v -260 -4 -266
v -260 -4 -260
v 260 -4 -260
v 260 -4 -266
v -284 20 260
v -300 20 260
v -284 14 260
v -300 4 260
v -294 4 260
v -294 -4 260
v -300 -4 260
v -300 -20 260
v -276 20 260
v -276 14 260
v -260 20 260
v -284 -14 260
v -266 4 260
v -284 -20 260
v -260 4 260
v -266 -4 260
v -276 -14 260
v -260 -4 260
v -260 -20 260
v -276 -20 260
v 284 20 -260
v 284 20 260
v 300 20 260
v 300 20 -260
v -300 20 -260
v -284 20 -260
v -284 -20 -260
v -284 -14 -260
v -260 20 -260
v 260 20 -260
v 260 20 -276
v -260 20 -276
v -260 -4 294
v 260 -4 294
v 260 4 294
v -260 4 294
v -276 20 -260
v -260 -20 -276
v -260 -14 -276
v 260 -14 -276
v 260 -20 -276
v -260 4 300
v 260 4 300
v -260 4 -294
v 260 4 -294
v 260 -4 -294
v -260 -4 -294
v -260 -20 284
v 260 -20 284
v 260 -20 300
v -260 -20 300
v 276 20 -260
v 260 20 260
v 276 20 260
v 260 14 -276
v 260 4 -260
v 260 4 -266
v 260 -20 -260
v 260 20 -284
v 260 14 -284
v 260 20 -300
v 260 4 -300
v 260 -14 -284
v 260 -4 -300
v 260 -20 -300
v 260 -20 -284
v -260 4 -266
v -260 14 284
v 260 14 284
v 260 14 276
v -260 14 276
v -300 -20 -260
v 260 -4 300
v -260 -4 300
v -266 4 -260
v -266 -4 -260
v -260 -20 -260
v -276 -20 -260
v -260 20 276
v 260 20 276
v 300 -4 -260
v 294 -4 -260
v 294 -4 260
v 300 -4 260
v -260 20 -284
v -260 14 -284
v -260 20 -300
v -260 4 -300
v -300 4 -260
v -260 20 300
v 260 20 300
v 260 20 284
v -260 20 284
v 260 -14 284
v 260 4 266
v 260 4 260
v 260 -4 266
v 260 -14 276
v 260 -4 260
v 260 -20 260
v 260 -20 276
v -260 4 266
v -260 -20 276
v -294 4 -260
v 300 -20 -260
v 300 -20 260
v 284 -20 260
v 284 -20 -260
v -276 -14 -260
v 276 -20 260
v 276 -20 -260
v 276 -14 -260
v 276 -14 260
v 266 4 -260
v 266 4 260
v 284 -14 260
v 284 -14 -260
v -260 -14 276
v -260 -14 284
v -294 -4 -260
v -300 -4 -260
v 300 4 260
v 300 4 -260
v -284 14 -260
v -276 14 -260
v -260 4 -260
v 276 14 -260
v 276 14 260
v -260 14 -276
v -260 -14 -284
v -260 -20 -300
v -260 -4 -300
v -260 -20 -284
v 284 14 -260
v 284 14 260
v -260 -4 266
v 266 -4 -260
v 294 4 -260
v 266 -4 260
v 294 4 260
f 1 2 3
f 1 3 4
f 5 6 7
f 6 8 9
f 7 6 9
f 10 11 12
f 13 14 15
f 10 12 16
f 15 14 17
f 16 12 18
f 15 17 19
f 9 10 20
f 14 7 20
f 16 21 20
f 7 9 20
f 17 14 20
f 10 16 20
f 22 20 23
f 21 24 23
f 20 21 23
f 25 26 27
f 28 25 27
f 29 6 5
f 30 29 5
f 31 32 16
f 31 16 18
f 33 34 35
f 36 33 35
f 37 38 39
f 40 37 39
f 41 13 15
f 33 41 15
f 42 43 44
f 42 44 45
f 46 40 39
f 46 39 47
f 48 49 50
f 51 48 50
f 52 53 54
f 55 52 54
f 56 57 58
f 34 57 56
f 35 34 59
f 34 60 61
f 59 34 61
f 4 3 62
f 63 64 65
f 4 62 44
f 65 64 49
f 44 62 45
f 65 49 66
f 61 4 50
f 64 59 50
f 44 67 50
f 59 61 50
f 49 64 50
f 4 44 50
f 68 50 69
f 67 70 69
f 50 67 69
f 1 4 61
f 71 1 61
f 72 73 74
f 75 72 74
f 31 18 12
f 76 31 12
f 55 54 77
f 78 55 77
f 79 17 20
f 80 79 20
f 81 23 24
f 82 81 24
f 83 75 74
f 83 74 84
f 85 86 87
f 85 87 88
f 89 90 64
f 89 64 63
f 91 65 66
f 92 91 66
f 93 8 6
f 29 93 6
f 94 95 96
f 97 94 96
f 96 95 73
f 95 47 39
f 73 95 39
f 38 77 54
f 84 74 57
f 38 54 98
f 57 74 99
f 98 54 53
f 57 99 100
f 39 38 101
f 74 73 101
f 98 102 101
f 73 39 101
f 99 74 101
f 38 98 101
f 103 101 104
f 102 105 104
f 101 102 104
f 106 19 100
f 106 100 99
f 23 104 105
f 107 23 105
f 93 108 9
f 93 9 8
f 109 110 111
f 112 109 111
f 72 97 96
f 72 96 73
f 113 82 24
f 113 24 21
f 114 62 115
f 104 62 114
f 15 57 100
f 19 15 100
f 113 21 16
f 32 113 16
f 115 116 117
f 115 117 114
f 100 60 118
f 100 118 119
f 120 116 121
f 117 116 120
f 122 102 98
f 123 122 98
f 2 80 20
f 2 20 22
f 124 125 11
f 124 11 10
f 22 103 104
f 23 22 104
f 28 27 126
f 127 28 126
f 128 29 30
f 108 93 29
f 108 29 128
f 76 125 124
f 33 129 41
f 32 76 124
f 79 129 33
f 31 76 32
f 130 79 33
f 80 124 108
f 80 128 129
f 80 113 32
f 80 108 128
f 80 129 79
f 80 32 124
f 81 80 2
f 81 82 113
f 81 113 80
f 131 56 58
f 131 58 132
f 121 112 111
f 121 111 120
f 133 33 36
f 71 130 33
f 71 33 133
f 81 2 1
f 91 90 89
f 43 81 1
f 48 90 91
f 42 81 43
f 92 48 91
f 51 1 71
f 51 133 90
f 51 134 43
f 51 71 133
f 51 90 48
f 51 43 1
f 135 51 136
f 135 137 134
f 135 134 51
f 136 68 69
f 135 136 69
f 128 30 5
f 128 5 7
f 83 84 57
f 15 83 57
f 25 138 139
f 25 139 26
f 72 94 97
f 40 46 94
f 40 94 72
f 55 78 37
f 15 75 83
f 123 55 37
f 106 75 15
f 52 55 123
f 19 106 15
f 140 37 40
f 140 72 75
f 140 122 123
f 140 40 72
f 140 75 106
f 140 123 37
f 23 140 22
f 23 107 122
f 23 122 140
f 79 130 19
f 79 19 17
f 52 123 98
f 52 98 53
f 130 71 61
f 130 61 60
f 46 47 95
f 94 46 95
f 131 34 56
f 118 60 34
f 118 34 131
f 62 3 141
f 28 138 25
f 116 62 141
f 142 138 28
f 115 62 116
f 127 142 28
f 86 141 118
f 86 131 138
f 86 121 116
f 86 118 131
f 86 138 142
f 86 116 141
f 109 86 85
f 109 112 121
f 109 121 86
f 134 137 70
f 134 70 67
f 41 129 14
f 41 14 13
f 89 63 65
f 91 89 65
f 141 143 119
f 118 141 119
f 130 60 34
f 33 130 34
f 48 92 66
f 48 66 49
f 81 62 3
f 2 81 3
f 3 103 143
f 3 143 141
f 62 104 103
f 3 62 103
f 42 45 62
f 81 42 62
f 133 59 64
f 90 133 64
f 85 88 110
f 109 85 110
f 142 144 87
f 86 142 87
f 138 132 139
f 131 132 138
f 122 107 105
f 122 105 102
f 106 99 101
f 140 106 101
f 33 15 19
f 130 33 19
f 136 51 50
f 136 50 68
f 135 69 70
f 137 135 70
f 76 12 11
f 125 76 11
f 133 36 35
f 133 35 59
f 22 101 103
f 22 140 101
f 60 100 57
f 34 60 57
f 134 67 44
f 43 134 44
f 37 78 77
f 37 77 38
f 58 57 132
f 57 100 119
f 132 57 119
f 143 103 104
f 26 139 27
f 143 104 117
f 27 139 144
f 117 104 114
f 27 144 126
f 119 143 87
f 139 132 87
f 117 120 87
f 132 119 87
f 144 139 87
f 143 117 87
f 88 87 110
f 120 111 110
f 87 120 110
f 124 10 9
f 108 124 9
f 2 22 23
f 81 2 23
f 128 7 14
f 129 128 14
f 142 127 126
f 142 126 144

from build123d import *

# Parameters (mm, degrees)
BOSS_EXTRUDE2_DEPTH        = 280
BOSS_EXTRUDE2_DEPTH_BACK   = 280
BOSS_EXTRUDE2_2_DEPTH      = 280
BOSS_EXTRUDE2_2_DEPTH_BACK = 280
BOSS_EXTRUDE3_DEPTH        = 280
BOSS_EXTRUDE3_DEPTH_BACK   = 280
CUT_EXTRUDE1_DEPTH         = 425.735211632
CUT_EXTRUDE1_DEPTH_BACK    = 425.735211632
SKETCH6_W                  = 40
SKETCH6_H                  = 40


with BuildPart() as part:
    # Sketch4 → Boss-Extrude2 (new, two sides: drawn at the far end of the back side and taken through both)
    with BuildSketch(Plane.XY.offset(-BOSS_EXTRUDE2_DEPTH_BACK)):
        Polygon((300, -20), (284, -20), (284, -14), (276, -14), (276, -20), (260, -20), (260, -4), (266, -4), (266, 4), (260, 4), (260, 20), (276, 20), (276, 14), (284, 14), (284, 20), (300, 20), (300, 4), (294, 4), (294, -4), (300, -4), align=None)
    extrude(amount=BOSS_EXTRUDE2_DEPTH + BOSS_EXTRUDE2_DEPTH_BACK)

    # Sketch5 → Boss-Extrude3 (add, two sides: drawn at the far end of the back side and taken through both)
    with BuildSketch(Plane(origin=(0, 0, 0), x_dir=(0, 0, -1), z_dir=(1, 0, 0)).offset(-BOSS_EXTRUDE3_DEPTH_BACK)):
        Polygon((300, -20), (284, -20), (284, -14), (276, -14), (276, -20), (260, -20), (260, -4), (266, -4), (266, 4), (260, 4), (260, 20), (276, 20), (276, 14), (284, 14), (284, 20), (300, 20), (300, 4), (294, 4), (294, -4), (300, -4), align=None)
        Polygon((-276, 20), (-260, 20), (-260, 4), (-266, 4), (-266, -4), (-260, -4), (-260, -20), (-276, -20), (-276, -14), (-284, -14), (-284, -20), (-300, -20), (-300, -4), (-294, -4), (-294, 4), (-300, 4), (-300, 20), (-284, 20), (-284, 14), (-276, 14), align=None)
    extrude(amount=BOSS_EXTRUDE3_DEPTH + BOSS_EXTRUDE3_DEPTH_BACK)


with BuildPart() as body_2:
    # Sketch4 → Boss-Extrude2 2 (new, two sides: drawn at the far end of the back side and taken through both)
    with BuildSketch(Plane.XY.offset(-BOSS_EXTRUDE2_2_DEPTH_BACK)):
        Polygon((-276, 20), (-260, 20), (-260, 4), (-266, 4), (-266, -4), (-260, -4), (-260, -20), (-276, -20), (-276, -14), (-284, -14), (-284, -20), (-300, -20), (-300, -4), (-294, -4), (-294, 4), (-300, 4), (-300, 20), (-284, 20), (-284, 14), (-276, 14), align=None)
    extrude(amount=BOSS_EXTRUDE2_2_DEPTH + BOSS_EXTRUDE2_2_DEPTH_BACK)


with BuildPart() as cut_extrude1_tool:
    # Sketch6 → Cut-Extrude1 (new, two sides: drawn at the far end of the back side and taken through both)
    with BuildSketch(Plane(origin=(0, 0, 0), x_dir=(1, 0, 0), z_dir=(0, 1, 0)).offset(-CUT_EXTRUDE1_DEPTH_BACK)):
        with Locations((-280, 280)):
            Rectangle(SKETCH6_W, SKETCH6_H)
        with Locations((-280, -280)):
            Rectangle(SKETCH6_W, SKETCH6_H)
        with Locations((280, -280)):
            Rectangle(SKETCH6_W, SKETCH6_H)
        with Locations((280, 280)):
            Rectangle(SKETCH6_W, SKETCH6_H)
    extrude(amount=CUT_EXTRUDE1_DEPTH + CUT_EXTRUDE1_DEPTH_BACK)


with BuildPart() as part_1:
    add(part.part)

    # Cut-Extrude1: cut by cut_extrude1_tool
    add(cut_extrude1_tool.part, mode=Mode.SUBTRACT)


with BuildPart() as body_2_1:
    add(body_2.part)

    # Cut-Extrude1: cut by cut_extrude1_tool
    add(cut_extrude1_tool.part, mode=Mode.SUBTRACT)


solid = Compound([part_1.part, body_2_1.part])
